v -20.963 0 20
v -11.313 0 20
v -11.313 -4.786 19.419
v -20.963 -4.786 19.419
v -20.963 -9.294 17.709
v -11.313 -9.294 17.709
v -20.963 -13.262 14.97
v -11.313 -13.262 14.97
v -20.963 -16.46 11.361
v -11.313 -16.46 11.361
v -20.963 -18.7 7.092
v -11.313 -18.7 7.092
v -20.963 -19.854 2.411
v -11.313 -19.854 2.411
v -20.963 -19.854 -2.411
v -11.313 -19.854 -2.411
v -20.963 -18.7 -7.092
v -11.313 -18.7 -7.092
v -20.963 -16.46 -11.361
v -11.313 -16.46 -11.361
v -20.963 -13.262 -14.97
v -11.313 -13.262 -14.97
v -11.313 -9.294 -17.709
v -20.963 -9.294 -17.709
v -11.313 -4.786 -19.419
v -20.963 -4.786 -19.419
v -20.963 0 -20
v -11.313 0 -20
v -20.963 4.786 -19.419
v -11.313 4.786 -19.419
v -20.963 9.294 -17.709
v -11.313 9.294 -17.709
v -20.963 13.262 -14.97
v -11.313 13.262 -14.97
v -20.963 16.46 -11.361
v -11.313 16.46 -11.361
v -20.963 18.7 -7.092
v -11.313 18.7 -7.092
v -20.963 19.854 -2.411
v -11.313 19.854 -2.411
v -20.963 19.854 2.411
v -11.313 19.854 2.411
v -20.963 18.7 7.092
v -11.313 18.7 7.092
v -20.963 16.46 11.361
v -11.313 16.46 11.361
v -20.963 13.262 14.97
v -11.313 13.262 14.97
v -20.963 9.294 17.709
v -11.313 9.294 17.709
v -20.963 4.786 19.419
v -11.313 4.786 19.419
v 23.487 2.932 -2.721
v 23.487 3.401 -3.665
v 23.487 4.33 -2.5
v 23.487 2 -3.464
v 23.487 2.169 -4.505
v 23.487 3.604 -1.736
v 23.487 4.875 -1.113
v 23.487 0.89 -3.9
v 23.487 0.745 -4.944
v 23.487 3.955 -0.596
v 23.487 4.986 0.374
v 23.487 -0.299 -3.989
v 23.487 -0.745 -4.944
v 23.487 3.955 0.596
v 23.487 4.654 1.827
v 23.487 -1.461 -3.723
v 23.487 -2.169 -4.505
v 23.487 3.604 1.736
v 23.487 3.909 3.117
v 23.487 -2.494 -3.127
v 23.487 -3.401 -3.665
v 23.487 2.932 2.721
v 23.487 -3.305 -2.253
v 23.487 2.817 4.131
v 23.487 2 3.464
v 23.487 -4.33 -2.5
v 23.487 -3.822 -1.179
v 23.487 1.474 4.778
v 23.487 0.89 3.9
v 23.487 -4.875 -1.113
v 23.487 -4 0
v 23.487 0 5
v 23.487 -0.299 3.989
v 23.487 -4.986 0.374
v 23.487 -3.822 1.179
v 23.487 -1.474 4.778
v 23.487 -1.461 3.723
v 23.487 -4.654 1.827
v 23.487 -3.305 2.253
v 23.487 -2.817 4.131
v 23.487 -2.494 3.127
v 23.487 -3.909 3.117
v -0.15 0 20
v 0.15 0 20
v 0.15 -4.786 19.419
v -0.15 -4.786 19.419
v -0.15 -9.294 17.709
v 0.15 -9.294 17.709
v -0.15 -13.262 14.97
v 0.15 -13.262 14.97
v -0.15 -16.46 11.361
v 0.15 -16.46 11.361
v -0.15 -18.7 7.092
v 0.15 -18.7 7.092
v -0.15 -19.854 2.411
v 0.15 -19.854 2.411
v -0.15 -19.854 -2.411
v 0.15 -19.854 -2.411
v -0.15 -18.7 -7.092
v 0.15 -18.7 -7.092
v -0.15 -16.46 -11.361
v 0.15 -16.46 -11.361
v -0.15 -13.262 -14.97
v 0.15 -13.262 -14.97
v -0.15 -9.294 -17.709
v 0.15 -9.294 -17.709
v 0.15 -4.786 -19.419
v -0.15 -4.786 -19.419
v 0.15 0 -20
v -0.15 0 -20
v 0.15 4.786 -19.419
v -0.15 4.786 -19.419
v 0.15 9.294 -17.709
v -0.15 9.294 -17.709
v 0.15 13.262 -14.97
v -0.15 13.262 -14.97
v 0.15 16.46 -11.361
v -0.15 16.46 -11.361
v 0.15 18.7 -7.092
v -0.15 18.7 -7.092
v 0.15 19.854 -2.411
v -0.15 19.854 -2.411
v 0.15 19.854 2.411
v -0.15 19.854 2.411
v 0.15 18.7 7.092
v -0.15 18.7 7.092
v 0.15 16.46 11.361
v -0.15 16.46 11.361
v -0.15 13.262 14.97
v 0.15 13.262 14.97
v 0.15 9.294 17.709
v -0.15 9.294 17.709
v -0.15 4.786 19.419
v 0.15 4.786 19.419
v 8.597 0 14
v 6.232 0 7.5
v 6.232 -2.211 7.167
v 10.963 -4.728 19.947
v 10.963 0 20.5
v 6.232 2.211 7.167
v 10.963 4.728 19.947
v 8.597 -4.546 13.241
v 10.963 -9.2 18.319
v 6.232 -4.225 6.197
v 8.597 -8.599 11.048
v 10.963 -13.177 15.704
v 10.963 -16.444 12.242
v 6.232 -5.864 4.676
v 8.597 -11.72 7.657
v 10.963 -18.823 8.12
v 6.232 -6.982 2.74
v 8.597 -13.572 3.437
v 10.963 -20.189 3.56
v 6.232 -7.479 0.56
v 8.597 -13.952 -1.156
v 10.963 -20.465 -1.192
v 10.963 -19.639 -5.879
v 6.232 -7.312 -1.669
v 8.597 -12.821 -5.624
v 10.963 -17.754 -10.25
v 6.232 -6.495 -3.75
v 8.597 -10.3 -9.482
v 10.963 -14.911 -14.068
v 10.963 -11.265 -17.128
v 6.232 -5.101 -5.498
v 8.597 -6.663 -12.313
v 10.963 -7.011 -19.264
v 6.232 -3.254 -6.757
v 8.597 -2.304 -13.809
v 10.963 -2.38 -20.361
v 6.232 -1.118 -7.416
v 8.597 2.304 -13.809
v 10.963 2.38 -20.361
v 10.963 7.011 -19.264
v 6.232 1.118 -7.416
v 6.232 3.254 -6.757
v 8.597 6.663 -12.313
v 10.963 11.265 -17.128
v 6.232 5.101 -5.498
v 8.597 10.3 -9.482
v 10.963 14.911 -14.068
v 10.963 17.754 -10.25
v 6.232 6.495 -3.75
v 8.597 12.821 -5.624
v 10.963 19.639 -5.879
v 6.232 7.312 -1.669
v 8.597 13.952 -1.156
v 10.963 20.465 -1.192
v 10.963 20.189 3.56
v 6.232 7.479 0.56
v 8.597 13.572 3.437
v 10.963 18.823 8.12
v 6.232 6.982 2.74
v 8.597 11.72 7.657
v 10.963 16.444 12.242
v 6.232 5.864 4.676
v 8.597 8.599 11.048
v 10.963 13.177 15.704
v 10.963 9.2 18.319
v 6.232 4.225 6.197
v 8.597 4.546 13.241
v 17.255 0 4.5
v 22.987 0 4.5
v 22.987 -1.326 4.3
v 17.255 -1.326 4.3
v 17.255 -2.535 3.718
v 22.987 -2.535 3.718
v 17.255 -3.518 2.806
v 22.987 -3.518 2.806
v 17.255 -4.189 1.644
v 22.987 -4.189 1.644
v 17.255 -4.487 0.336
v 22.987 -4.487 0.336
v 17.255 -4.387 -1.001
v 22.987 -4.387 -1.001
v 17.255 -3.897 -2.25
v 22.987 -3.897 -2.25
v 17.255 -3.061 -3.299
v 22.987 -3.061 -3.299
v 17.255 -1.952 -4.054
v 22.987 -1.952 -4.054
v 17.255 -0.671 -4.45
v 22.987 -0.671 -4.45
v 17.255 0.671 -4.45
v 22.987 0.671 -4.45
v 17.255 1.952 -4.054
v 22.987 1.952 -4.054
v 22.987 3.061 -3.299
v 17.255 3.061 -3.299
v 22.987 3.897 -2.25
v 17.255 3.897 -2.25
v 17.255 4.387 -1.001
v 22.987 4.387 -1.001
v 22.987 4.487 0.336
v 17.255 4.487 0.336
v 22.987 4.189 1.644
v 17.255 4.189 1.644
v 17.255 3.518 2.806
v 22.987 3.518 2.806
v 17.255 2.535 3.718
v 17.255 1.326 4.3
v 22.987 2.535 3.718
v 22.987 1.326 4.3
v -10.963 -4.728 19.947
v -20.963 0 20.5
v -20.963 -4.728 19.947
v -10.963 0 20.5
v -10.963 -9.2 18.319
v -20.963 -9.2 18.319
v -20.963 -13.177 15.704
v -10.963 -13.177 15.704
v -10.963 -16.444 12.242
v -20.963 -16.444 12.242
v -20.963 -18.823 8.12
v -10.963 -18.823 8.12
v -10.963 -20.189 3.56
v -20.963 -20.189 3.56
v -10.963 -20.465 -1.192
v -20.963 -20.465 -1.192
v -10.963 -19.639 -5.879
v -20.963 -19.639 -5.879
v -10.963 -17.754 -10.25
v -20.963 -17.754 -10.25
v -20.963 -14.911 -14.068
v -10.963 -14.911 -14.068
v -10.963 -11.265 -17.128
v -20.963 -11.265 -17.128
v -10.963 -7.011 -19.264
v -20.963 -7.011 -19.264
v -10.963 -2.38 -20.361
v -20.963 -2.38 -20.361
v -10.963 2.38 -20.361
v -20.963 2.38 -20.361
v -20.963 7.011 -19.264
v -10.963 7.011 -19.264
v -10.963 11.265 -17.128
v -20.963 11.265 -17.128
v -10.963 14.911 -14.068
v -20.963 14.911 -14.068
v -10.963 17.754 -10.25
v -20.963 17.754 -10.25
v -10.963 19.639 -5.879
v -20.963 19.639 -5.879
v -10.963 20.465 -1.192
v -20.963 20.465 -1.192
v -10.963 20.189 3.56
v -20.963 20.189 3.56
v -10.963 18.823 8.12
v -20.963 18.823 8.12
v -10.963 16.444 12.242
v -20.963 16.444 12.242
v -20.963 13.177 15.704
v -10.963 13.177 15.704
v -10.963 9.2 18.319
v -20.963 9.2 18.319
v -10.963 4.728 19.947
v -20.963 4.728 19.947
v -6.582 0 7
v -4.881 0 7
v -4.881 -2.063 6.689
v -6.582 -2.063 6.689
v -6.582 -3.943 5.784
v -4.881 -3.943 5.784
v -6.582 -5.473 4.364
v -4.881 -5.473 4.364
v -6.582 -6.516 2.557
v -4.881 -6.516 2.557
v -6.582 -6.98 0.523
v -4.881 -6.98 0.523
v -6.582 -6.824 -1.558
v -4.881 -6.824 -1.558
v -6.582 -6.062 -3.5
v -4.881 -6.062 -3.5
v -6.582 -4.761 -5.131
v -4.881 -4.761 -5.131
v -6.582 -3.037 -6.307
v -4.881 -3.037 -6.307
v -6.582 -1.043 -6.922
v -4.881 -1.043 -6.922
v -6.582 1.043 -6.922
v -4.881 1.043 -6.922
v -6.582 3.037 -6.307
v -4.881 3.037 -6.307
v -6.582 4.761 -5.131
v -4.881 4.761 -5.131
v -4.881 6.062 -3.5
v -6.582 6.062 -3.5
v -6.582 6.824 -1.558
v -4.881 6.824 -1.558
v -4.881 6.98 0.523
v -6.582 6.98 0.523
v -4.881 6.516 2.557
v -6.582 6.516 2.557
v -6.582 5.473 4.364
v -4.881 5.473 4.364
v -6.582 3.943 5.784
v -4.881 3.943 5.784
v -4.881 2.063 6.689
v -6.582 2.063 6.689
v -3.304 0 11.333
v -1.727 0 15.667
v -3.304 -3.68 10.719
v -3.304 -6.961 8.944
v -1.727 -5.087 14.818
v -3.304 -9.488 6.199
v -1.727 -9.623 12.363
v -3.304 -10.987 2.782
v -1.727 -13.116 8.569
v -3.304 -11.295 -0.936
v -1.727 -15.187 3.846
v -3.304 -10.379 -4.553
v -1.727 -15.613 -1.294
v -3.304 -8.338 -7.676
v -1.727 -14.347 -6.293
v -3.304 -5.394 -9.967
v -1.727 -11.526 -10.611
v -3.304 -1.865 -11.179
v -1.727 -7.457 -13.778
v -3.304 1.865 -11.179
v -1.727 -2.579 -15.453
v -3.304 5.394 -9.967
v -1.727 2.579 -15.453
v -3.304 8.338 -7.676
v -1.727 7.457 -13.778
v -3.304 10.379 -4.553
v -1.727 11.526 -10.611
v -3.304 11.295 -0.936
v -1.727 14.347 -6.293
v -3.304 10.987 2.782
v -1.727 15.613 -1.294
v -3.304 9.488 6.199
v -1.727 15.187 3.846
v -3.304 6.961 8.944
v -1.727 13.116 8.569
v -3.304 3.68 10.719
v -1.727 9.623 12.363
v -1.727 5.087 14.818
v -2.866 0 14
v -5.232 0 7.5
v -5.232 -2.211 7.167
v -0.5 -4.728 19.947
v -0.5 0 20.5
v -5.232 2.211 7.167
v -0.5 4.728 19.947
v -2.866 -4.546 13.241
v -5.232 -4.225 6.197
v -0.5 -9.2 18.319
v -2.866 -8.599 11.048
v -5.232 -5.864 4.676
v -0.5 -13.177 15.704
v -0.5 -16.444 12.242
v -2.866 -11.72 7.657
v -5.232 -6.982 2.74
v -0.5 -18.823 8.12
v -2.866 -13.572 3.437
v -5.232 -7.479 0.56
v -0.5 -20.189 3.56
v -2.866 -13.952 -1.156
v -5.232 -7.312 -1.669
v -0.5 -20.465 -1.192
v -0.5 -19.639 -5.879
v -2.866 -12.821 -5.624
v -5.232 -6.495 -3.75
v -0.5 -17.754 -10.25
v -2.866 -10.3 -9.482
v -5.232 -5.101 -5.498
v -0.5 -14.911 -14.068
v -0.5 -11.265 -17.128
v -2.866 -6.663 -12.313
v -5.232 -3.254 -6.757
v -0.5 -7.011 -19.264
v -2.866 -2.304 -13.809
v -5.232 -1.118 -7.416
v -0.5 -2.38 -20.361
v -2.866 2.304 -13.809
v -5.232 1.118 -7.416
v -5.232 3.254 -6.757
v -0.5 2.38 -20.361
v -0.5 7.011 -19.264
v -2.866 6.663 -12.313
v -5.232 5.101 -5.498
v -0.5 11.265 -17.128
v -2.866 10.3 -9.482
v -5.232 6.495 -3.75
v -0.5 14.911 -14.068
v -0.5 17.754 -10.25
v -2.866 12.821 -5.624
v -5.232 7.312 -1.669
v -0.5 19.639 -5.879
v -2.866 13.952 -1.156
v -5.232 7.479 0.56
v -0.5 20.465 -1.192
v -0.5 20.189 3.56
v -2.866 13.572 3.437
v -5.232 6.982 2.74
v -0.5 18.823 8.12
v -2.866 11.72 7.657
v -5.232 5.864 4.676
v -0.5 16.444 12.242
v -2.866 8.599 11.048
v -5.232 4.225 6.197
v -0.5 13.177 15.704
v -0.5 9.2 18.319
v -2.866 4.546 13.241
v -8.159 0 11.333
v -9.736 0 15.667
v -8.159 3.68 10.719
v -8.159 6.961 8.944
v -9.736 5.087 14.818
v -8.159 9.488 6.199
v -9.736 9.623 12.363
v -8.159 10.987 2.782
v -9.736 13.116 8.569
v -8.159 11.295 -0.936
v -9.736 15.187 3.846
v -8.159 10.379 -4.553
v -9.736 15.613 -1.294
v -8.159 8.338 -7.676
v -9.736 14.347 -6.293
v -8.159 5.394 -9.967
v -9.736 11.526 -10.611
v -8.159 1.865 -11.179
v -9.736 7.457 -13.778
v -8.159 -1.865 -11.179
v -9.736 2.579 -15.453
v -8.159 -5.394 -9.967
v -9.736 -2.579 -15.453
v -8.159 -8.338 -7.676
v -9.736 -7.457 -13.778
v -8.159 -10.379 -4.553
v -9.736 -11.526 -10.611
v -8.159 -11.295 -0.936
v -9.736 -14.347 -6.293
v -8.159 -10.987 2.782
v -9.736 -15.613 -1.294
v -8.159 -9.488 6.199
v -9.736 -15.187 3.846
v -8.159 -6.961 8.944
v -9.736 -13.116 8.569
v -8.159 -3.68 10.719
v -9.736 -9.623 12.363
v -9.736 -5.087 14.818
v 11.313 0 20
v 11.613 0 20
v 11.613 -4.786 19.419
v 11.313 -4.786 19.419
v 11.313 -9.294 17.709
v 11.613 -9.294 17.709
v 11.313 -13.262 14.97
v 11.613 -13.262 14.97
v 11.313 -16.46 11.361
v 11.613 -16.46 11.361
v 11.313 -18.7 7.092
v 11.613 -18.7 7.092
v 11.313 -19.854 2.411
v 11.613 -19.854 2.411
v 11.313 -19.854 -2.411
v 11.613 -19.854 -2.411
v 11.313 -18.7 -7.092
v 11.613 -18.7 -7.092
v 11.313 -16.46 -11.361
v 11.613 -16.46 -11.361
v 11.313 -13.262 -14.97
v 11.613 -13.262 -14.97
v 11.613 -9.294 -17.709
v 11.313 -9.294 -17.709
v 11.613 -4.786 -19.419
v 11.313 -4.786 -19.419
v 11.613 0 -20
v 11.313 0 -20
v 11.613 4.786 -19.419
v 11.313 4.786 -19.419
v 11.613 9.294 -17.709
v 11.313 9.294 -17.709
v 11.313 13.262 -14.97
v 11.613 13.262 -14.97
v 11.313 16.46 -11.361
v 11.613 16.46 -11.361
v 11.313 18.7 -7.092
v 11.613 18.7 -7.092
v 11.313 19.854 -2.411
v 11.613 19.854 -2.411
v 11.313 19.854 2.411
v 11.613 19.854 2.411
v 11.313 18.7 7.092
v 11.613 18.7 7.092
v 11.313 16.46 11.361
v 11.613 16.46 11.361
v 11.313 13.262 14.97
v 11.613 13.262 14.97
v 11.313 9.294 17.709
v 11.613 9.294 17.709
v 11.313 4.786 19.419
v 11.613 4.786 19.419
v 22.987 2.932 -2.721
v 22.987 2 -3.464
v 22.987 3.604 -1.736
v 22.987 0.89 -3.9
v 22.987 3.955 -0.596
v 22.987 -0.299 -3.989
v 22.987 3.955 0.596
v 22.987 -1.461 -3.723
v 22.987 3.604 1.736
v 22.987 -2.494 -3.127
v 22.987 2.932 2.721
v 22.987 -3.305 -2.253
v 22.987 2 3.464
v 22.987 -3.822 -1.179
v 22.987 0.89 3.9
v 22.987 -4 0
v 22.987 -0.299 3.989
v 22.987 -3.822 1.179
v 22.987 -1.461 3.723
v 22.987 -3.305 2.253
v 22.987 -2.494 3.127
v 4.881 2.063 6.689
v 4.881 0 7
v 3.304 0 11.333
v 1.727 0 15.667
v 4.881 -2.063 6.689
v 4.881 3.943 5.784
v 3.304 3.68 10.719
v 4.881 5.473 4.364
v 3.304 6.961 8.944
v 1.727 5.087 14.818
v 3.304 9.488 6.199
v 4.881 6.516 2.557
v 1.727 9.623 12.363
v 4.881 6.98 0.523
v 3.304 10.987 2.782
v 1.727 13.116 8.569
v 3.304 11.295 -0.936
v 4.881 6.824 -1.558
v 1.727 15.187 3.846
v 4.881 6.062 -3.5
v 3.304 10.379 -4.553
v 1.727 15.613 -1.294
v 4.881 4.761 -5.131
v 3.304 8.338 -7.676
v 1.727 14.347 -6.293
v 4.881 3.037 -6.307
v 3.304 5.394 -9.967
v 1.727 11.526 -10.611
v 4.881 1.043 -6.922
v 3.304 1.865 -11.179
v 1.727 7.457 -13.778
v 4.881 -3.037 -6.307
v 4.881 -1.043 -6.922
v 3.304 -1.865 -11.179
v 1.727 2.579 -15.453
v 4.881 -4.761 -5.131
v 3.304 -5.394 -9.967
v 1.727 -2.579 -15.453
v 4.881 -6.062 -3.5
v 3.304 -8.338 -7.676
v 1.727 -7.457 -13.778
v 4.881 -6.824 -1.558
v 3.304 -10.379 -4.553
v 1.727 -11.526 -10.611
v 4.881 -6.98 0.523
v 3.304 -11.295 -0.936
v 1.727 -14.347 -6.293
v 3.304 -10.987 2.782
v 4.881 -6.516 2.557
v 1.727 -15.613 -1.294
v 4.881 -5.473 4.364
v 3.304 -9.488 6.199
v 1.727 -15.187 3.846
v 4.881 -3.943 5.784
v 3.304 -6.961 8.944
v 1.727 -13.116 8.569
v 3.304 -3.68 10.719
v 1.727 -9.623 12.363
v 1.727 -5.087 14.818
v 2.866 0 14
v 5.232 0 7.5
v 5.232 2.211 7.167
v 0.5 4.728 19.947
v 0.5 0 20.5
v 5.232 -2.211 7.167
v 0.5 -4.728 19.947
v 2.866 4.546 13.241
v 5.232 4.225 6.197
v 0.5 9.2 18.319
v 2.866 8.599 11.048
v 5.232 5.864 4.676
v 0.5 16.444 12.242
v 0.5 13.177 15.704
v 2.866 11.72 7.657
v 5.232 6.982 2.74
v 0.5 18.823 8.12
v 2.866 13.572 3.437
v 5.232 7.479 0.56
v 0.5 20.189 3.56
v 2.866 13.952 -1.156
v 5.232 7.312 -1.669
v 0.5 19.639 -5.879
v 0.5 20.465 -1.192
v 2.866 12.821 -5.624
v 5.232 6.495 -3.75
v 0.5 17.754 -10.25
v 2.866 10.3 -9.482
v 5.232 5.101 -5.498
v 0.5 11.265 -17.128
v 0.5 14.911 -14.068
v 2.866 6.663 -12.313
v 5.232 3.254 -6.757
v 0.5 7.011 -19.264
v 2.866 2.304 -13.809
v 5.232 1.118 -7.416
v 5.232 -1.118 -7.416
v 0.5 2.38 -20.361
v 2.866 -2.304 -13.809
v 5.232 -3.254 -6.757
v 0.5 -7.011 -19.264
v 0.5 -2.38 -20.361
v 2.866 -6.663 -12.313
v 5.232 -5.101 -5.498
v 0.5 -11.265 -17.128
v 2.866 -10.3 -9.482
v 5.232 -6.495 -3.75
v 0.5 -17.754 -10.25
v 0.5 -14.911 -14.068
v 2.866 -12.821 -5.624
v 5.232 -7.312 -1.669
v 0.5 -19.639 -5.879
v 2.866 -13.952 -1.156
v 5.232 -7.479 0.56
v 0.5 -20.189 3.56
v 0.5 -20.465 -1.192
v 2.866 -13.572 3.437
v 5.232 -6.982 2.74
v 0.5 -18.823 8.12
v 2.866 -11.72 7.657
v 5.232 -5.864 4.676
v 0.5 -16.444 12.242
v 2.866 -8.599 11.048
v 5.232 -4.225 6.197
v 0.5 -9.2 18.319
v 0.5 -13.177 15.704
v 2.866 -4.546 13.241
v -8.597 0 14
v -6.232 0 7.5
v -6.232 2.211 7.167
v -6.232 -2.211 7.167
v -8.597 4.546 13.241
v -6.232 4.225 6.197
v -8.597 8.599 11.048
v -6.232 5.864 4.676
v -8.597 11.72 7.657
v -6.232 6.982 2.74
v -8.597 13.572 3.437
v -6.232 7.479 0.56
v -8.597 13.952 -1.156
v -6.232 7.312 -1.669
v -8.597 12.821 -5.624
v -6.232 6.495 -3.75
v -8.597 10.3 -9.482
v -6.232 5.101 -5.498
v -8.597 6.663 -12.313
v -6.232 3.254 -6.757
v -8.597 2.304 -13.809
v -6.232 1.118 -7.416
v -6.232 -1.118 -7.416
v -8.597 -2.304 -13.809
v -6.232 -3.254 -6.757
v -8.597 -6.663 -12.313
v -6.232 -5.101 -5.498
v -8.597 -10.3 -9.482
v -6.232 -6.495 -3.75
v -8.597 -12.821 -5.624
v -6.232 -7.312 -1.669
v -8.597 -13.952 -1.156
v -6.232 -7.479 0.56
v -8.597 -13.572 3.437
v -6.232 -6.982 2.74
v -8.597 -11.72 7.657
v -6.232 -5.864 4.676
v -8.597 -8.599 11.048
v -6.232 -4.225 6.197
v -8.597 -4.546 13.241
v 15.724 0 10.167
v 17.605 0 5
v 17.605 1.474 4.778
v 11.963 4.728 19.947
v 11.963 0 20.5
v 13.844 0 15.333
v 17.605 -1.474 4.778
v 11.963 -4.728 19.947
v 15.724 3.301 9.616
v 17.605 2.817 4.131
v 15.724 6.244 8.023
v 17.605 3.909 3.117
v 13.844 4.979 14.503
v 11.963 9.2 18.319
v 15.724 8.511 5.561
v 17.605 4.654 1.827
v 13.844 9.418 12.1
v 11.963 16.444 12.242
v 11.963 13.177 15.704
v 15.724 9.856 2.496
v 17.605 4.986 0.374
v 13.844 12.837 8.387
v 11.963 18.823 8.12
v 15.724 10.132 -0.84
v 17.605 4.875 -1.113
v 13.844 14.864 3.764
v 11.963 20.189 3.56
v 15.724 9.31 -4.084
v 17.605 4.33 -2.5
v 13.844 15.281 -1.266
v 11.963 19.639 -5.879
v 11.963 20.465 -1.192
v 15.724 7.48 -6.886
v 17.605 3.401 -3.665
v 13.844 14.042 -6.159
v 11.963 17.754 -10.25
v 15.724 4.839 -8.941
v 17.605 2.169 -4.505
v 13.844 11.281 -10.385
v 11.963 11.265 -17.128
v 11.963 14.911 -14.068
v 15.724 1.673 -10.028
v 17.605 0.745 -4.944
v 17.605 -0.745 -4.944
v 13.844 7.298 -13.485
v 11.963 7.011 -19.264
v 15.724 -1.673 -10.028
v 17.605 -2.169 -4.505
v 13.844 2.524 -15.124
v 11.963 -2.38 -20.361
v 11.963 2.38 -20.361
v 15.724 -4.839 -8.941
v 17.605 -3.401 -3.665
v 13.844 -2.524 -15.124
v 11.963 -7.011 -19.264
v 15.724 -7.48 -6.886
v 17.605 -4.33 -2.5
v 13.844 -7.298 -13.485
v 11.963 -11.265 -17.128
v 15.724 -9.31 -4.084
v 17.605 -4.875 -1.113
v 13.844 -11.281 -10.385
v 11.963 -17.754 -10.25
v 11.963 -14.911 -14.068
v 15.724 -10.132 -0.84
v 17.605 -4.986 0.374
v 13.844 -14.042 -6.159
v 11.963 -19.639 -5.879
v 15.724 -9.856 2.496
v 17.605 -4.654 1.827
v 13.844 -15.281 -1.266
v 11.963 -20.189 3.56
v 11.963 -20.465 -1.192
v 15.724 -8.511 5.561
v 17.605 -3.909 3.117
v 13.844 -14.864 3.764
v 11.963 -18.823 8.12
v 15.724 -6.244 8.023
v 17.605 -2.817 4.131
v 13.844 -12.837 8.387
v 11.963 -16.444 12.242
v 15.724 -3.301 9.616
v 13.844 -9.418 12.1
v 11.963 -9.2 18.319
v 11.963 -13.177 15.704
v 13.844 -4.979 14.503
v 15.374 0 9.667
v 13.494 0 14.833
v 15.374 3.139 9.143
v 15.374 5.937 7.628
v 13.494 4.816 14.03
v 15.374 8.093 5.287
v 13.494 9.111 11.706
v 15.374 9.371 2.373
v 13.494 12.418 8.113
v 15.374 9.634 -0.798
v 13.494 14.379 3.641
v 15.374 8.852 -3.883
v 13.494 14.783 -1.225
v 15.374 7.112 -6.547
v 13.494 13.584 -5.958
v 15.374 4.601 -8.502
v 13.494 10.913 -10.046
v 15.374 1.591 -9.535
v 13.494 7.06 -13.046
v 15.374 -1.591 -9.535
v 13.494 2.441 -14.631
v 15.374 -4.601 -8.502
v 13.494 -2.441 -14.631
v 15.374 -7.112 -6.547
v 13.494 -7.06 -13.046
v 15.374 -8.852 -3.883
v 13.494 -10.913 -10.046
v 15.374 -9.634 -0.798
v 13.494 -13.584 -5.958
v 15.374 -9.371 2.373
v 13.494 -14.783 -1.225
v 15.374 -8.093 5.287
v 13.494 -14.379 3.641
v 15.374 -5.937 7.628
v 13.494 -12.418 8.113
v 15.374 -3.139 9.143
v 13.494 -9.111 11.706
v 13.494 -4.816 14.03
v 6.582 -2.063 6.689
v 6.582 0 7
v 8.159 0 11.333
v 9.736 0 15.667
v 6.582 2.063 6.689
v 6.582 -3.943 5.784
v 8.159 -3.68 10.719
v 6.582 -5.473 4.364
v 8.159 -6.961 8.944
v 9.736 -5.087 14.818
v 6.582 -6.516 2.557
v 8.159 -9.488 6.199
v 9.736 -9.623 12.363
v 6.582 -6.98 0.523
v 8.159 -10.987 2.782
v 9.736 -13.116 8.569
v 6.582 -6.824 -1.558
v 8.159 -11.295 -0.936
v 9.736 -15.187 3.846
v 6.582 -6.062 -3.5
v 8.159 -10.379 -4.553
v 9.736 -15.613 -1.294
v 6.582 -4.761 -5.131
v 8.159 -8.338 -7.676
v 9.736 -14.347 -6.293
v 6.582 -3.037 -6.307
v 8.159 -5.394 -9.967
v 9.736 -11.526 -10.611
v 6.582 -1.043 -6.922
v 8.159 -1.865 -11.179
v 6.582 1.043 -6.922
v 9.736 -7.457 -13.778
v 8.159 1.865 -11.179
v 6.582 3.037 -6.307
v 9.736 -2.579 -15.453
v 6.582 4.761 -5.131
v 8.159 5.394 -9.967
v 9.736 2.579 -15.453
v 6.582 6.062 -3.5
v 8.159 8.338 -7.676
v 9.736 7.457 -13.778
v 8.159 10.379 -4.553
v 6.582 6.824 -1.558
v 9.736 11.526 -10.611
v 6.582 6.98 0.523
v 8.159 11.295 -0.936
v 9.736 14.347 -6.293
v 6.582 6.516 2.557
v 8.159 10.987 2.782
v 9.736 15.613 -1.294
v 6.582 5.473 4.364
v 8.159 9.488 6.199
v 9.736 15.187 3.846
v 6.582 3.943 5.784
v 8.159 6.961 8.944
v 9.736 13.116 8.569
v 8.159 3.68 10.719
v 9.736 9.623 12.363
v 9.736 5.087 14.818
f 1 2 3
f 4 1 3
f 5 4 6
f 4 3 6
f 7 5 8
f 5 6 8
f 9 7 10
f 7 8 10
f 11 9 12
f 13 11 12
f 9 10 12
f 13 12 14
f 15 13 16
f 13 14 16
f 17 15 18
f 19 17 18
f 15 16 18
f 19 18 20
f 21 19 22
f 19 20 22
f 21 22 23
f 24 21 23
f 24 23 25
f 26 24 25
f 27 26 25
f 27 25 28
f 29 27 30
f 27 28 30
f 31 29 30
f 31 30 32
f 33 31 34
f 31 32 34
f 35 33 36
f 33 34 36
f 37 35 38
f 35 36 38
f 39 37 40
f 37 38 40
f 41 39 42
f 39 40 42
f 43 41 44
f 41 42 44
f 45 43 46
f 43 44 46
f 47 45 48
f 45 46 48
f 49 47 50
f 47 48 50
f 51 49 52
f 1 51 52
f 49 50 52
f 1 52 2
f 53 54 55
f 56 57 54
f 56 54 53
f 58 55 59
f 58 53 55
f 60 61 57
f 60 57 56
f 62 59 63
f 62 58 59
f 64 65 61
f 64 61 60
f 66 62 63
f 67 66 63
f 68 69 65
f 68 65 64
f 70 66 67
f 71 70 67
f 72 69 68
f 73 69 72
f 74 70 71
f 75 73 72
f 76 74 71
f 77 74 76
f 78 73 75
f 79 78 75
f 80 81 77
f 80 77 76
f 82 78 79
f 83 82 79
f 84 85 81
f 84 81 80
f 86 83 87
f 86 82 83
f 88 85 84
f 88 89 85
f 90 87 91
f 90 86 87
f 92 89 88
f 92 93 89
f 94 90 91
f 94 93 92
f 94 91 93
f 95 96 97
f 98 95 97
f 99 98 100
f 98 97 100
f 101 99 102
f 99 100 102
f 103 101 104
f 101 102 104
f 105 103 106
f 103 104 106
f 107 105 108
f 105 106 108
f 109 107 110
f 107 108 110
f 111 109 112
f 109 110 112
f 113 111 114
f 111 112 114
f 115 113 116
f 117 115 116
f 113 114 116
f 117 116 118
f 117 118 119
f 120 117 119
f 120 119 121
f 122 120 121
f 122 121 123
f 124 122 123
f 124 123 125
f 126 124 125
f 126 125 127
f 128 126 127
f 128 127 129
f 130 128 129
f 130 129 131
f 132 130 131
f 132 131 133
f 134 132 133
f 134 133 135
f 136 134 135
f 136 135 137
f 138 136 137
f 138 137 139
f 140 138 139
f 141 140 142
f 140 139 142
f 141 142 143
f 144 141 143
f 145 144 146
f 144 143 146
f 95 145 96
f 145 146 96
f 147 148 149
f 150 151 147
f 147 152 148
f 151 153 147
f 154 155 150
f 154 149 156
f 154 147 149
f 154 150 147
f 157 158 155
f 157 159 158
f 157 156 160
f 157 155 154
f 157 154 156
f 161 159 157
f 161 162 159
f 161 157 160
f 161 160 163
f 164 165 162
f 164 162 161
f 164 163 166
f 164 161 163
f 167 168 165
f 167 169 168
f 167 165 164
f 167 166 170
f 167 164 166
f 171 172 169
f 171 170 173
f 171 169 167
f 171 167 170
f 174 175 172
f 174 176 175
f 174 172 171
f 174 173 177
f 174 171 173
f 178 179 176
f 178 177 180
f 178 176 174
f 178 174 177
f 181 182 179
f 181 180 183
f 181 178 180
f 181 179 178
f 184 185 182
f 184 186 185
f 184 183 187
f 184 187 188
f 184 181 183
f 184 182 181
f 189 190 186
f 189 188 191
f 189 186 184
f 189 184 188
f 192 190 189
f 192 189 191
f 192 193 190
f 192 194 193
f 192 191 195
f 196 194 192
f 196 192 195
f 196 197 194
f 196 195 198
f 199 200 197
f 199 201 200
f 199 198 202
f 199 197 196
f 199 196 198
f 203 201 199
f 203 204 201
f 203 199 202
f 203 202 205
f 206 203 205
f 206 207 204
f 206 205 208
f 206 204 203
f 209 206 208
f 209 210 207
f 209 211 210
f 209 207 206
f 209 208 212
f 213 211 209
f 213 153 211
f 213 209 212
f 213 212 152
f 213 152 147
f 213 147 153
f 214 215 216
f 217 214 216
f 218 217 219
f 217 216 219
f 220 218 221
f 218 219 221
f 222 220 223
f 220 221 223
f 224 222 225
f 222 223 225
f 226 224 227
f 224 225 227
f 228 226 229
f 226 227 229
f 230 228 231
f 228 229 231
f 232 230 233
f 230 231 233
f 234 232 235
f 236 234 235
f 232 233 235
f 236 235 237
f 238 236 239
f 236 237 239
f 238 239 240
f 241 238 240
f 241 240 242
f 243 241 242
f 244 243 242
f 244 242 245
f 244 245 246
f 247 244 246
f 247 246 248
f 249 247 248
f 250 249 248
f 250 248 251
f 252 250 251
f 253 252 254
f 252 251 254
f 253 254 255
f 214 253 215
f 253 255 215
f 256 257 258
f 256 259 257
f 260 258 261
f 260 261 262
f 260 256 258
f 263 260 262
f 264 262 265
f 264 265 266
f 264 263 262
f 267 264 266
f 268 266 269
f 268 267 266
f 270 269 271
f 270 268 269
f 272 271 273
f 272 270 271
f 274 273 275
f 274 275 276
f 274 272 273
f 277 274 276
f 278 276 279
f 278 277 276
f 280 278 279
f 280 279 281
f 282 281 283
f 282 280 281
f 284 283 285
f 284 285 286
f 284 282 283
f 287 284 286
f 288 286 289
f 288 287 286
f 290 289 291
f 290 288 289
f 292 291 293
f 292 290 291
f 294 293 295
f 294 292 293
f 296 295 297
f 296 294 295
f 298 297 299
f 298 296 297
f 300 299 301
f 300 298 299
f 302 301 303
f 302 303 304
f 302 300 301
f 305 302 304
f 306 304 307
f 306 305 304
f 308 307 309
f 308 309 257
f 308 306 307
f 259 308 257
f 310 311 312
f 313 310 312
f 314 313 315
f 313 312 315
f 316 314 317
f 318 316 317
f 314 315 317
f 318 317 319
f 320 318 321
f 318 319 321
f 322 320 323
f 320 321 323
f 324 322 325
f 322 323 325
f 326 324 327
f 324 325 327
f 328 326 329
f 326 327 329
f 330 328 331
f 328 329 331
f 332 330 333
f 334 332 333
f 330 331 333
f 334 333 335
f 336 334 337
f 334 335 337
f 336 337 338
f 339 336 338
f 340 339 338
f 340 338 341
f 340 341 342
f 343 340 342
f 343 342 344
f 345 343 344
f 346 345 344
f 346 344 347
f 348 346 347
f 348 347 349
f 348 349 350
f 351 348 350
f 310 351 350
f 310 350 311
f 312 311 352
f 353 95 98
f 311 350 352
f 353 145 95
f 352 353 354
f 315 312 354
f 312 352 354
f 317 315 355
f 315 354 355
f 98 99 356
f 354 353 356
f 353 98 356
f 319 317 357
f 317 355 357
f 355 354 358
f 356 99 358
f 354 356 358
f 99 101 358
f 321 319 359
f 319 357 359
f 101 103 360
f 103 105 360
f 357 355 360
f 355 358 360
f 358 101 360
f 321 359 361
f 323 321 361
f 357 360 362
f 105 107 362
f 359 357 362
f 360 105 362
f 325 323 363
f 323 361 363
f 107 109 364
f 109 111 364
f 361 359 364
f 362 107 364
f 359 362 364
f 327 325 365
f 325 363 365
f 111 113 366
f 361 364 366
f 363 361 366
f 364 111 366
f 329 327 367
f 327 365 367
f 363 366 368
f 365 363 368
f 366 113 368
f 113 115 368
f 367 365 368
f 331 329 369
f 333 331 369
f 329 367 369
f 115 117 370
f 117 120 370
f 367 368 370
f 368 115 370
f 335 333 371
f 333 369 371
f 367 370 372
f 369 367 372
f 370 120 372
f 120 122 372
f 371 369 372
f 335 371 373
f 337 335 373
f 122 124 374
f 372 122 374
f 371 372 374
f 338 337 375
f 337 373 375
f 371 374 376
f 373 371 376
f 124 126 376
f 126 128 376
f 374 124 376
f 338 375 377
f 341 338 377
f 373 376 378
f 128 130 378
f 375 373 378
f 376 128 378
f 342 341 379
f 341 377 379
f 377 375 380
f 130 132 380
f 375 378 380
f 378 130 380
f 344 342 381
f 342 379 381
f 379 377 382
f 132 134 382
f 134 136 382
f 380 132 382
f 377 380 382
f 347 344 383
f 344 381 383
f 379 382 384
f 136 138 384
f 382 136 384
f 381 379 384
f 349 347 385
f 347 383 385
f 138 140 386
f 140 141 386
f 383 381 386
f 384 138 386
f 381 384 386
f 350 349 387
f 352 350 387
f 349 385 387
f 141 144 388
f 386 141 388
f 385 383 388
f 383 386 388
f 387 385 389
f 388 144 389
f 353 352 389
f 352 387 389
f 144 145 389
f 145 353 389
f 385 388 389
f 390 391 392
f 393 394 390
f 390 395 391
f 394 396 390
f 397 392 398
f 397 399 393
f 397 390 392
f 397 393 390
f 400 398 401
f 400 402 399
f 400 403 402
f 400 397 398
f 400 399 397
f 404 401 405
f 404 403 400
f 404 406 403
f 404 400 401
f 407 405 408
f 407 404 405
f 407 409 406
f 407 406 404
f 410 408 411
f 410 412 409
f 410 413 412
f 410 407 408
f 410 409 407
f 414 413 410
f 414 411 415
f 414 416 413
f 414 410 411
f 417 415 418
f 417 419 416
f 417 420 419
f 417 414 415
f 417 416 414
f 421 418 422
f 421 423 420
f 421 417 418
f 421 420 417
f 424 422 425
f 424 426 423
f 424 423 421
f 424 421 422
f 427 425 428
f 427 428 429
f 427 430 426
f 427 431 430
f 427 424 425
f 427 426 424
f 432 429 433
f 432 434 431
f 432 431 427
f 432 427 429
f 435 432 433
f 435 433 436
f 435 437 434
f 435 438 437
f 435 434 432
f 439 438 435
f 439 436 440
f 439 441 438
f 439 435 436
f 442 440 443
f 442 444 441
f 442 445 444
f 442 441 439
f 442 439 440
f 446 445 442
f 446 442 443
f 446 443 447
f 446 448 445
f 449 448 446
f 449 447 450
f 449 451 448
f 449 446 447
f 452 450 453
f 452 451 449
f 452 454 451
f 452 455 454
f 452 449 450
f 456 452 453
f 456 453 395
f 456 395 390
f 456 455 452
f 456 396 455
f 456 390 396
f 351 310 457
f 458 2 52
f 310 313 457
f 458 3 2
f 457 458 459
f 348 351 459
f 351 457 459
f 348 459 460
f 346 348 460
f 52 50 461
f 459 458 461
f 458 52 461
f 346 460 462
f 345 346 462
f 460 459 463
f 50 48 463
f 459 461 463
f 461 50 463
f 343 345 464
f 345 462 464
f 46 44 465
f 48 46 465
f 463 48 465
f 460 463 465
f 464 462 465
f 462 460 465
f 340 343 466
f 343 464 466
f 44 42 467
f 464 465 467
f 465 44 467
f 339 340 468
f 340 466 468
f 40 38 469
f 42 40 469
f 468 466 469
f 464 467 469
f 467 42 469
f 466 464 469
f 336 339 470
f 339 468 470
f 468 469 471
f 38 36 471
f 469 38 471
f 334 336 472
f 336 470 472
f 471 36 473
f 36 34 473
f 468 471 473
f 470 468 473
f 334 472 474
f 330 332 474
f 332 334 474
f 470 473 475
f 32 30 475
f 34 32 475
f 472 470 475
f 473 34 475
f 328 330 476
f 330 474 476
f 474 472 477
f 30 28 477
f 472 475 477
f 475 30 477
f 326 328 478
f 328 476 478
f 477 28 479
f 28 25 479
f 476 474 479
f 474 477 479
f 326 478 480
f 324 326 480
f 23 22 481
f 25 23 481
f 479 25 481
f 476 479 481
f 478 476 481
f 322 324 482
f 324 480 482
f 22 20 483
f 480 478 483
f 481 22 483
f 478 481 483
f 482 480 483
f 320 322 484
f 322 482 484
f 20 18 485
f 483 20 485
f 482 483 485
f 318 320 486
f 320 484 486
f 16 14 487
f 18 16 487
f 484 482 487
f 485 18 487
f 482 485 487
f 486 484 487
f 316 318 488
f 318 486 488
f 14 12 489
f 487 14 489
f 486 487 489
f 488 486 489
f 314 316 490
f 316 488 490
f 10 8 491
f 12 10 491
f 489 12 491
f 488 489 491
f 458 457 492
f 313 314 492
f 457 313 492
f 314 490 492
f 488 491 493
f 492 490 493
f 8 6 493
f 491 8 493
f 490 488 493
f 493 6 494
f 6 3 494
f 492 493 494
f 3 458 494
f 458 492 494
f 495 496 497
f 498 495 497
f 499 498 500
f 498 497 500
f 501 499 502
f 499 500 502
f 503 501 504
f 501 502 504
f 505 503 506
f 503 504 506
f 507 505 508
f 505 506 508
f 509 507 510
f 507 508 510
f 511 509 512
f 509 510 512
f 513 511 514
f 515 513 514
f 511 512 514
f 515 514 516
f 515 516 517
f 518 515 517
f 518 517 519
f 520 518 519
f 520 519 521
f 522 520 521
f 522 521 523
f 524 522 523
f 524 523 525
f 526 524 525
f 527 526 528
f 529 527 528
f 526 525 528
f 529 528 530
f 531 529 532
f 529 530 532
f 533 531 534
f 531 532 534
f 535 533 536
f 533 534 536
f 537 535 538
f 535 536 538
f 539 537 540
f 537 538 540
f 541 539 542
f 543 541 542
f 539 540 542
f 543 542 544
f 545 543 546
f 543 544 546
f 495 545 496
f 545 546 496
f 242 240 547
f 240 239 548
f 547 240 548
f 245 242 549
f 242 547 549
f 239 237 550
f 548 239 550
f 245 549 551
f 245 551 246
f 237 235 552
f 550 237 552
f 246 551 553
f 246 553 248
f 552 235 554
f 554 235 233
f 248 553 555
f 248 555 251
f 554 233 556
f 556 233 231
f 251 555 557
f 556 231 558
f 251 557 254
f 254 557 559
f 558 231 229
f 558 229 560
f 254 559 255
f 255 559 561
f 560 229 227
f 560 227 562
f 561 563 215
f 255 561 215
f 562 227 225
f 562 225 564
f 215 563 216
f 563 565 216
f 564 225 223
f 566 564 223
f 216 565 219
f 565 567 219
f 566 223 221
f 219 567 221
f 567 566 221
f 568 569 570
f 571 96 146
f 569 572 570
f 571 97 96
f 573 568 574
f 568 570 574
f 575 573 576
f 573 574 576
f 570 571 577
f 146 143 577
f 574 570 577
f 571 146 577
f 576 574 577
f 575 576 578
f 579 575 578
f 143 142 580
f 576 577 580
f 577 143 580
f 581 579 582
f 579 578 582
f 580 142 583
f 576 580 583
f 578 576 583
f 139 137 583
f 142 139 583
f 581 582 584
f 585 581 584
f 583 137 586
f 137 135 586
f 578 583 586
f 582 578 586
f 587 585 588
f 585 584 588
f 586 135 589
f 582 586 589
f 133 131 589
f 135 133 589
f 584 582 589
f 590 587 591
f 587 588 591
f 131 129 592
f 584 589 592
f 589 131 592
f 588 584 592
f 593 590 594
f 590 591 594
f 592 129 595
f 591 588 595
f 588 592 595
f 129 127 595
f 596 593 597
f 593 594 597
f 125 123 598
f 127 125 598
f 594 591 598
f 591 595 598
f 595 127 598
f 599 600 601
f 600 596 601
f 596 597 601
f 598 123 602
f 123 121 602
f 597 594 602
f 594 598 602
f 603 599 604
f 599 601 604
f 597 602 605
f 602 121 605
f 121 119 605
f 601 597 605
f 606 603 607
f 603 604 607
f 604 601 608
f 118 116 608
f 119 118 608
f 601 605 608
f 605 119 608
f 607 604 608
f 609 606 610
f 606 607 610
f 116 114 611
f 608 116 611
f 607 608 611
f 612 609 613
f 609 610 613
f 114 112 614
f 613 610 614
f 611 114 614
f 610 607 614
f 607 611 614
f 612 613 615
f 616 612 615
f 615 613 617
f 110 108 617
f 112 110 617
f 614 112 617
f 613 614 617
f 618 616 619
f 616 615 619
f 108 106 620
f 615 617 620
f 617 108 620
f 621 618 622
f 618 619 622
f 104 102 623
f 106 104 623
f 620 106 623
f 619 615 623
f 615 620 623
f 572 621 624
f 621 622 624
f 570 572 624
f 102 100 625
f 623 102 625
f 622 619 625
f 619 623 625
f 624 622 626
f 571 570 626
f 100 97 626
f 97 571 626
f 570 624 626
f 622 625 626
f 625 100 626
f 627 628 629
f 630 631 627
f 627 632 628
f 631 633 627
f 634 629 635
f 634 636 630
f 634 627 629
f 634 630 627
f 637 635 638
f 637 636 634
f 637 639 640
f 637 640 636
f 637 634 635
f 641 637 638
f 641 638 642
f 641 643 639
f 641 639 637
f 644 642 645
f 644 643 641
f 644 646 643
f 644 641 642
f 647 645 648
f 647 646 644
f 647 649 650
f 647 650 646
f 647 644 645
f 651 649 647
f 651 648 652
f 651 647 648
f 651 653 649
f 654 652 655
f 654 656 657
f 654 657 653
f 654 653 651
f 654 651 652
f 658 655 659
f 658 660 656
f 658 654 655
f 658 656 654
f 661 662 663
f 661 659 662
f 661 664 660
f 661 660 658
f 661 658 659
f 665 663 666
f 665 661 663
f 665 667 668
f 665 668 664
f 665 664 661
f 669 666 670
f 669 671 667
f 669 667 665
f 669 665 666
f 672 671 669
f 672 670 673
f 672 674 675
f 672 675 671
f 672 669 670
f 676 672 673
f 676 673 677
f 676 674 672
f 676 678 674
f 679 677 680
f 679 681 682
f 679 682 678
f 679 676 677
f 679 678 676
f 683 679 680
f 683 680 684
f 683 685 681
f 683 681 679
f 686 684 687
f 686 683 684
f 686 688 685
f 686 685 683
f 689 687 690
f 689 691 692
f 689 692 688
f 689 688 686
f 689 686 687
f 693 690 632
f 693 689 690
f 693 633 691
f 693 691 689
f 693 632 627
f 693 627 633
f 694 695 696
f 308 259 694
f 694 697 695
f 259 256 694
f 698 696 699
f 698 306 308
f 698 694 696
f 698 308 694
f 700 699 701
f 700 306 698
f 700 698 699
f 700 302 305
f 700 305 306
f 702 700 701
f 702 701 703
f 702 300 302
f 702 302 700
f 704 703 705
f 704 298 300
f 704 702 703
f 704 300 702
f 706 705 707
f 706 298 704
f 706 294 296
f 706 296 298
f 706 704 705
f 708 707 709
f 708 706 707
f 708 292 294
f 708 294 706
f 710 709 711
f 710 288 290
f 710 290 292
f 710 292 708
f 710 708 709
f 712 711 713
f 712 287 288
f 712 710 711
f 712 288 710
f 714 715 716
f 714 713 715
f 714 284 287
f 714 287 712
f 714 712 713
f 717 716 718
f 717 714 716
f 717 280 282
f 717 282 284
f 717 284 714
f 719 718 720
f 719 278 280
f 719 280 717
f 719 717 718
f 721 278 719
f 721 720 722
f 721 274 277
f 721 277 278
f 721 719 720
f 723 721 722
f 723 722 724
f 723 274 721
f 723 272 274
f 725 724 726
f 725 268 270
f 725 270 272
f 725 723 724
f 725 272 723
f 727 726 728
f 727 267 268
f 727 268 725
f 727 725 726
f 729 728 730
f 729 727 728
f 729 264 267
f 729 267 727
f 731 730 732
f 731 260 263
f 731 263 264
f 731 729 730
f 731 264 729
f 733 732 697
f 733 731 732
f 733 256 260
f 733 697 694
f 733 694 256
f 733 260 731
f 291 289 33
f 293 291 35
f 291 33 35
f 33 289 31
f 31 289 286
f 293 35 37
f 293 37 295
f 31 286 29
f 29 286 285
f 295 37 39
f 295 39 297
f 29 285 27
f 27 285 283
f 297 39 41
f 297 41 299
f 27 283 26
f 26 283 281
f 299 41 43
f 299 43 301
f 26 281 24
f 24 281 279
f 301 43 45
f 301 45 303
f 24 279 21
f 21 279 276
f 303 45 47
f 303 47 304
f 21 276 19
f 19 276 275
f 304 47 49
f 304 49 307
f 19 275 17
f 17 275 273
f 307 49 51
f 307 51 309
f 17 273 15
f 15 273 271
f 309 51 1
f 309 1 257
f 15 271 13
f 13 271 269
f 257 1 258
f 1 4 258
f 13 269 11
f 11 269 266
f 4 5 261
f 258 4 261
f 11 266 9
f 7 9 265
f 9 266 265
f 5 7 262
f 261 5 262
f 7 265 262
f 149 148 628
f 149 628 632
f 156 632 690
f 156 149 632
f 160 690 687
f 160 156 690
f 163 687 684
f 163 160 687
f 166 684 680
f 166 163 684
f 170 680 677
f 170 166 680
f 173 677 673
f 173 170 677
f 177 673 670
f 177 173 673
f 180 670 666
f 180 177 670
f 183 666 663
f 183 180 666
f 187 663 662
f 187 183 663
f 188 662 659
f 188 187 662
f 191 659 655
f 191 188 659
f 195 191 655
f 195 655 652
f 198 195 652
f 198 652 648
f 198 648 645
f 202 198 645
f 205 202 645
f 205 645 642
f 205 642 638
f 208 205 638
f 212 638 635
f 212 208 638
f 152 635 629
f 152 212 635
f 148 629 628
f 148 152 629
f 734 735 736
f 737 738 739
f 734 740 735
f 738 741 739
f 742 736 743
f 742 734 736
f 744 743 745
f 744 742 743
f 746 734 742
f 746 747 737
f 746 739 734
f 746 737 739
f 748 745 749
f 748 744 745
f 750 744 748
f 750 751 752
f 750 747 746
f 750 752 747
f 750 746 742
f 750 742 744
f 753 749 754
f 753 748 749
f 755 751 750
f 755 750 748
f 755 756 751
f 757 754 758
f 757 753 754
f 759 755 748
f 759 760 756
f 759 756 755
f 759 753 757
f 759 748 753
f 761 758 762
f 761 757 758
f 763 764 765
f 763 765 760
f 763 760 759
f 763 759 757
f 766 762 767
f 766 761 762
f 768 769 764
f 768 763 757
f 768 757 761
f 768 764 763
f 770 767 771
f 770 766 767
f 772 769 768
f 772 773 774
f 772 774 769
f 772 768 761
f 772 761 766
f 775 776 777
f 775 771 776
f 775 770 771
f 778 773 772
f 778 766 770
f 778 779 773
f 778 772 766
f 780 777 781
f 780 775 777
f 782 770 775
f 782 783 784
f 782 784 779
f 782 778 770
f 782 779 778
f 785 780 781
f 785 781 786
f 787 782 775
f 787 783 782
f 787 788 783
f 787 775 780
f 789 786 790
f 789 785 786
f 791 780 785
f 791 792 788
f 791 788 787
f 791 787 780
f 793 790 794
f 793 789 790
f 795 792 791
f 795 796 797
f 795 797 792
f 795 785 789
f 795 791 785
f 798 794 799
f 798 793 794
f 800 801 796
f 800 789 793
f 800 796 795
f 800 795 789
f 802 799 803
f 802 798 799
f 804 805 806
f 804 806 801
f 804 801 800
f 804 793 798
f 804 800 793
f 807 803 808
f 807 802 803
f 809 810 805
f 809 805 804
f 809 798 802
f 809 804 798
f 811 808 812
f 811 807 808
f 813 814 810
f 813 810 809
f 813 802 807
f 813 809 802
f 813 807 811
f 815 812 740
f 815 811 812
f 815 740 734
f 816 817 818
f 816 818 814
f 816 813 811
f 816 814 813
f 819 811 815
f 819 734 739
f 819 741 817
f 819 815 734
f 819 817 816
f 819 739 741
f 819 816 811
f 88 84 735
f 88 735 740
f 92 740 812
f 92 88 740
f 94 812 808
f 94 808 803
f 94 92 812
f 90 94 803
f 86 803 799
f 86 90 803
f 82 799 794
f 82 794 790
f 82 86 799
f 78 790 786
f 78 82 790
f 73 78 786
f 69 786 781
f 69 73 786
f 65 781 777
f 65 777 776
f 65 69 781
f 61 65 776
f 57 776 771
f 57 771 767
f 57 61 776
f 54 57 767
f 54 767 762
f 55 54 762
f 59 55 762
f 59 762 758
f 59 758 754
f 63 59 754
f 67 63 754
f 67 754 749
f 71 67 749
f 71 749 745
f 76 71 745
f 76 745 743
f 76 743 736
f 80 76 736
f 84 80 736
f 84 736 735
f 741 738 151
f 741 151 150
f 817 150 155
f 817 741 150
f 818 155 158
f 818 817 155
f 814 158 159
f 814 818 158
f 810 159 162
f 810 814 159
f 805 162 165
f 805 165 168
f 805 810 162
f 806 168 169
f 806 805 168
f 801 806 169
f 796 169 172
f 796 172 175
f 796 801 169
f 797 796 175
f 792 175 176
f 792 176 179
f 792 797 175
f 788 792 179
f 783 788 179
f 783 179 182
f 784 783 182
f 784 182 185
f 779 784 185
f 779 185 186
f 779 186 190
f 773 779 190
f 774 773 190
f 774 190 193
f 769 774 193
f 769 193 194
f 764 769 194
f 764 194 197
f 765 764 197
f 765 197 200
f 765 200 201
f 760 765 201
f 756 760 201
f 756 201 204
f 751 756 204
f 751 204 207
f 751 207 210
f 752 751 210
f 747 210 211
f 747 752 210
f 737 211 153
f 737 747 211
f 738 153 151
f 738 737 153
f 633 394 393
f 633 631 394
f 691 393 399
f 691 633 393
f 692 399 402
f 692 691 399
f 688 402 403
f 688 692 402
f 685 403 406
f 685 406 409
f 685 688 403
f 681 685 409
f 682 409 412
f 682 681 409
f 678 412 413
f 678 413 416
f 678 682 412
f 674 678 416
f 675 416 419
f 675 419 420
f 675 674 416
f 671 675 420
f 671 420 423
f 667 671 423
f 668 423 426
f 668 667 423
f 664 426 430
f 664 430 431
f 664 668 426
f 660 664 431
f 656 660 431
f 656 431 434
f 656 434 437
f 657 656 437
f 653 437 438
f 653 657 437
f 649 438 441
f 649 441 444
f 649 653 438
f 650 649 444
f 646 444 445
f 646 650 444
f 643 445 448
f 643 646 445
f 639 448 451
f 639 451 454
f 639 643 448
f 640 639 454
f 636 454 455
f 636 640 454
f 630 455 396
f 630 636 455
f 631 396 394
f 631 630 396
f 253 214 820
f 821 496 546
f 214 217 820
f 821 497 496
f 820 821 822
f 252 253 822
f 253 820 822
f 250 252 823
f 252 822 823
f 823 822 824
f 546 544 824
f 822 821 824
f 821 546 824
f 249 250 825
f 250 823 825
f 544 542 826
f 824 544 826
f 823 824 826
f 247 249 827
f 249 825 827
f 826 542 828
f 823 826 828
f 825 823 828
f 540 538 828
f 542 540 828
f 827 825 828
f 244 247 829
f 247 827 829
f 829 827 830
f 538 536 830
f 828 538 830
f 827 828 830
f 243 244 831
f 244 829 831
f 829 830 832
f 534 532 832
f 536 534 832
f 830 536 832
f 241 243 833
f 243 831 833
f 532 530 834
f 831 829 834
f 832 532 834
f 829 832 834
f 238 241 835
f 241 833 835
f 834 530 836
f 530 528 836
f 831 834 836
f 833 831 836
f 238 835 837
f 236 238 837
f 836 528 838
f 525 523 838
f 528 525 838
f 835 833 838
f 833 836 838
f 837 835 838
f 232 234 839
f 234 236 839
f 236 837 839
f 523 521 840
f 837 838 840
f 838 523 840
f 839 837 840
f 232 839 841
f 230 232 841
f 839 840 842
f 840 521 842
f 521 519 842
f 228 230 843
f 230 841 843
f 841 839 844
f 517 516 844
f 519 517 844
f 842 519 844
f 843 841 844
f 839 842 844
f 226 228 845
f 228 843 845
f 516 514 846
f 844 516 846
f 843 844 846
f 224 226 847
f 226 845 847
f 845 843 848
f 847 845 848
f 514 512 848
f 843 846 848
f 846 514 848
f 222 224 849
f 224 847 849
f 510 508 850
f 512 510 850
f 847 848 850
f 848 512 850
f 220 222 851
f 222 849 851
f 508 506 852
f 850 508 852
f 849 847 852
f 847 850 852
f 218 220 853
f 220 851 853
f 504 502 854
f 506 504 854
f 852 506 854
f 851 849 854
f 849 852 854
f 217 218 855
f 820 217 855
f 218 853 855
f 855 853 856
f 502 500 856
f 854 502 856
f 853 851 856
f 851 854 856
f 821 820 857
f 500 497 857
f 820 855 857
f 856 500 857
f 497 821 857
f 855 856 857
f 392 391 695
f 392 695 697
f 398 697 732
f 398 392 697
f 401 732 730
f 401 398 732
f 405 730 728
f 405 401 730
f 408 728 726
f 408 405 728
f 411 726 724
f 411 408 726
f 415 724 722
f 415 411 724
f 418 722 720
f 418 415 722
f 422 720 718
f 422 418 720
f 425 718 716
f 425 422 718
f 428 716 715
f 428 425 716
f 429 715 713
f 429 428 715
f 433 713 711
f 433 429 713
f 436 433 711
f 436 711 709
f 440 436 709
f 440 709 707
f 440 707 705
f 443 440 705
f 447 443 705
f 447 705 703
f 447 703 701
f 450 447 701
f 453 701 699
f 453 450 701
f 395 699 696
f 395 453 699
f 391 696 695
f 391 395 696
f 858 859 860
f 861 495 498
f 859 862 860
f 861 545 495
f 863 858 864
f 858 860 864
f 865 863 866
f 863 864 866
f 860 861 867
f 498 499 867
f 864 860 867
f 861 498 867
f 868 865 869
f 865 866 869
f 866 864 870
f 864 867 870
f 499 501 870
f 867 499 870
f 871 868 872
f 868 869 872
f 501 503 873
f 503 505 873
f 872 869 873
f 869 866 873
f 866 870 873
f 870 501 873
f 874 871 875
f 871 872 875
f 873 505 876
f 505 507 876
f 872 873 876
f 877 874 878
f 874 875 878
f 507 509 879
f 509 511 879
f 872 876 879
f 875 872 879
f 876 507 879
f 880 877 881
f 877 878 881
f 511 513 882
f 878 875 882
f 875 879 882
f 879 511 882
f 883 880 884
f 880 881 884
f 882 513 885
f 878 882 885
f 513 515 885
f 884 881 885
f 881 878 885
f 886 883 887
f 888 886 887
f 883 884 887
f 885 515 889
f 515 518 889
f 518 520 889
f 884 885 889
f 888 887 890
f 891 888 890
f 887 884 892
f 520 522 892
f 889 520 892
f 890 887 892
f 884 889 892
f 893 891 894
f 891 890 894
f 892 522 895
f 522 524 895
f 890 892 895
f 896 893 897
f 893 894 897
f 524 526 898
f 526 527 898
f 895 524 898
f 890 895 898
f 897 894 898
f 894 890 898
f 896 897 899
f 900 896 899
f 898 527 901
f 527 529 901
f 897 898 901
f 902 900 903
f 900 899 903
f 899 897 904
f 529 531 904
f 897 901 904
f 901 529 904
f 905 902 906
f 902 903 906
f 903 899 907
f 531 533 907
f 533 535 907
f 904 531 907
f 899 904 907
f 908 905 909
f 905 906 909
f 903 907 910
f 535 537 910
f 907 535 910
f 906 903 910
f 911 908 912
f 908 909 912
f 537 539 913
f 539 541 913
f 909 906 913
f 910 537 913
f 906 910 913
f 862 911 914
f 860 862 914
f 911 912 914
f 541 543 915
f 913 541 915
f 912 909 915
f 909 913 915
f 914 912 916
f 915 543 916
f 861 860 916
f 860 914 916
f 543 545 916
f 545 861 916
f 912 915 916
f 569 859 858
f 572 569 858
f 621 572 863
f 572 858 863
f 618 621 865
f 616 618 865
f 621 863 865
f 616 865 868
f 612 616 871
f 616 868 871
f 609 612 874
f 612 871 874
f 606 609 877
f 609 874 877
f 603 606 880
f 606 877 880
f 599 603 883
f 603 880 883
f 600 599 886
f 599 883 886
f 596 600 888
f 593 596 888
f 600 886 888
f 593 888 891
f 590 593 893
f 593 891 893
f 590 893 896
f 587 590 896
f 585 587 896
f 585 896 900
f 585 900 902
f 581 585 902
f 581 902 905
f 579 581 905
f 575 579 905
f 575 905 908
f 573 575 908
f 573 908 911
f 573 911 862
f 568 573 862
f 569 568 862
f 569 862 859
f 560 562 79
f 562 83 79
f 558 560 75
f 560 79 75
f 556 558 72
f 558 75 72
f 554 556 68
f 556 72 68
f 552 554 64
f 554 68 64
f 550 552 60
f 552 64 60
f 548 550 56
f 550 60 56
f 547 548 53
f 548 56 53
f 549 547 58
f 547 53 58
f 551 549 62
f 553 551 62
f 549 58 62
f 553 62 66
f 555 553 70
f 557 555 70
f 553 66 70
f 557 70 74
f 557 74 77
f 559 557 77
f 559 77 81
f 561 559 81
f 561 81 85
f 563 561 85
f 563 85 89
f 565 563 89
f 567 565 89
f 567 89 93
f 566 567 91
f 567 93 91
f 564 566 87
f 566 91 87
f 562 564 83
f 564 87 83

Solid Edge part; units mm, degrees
sketch "Sketch1" plane through (10.8674, 0, 10.8674) normal (0, -1, 0) x (1, 0, 0)
  line L0 (-31.8306, -10.8674) -> (-31.8306, 9.6326)
  line L1 (-31.8306, 9.6326) -> (-21.8306, 9.6326)
  line L2 (-21.8306, 9.6326) -> (-17.099, -3.3674)
  line L3 (-17.099, -3.3674) -> (-16.099, -3.3674)
  line L4 (-16.099, -3.3674) -> (-11.3674, 9.6326)
  line L5 (-11.3674, 9.6326) -> (-10.3674, 9.6326)
  line L6 (-10.3674, 9.6326) -> (-5.6358, -3.3674)
  line L7 (-5.6358, -3.3674) -> (-4.6358, -3.3674)
  line L8 (-4.6358, -3.3674) -> (0.0958, 9.6326)
  line L9 (0.0958, 9.6326) -> (1.0958, 9.6326)
  line L10 (1.0958, 9.6326) -> (6.7374, -5.8674)
  line L11 (6.7374, -5.8674) -> (12.6194, -5.8674)
  line L12 (12.6194, -5.8674) -> (12.6194, -10.8674)
  dimension "D1" = 44.45
  dimension "D2" = 10
  dimension "D3" = 1
  dimension "D4" = 1
revolve "RevolvedProtrusion1" add sketch "Sketch1" angle 360 about axis through (-17.7633, 0, 0) along (1, 0, 0)
shell "Thinwall1" thickness 0.5 removed faces 1 at (-20.9632, 13.2567, 14.0767)
sketch "Sketch2" plane through (23.4868, 0, 0) normal (1, 0, 0) x (0, -1, 0)
  circle A0 centre (0, 0) radius 4
extrude "Cutout1" cut sketch "Sketch2" against normal through all
properties material "Steel"
